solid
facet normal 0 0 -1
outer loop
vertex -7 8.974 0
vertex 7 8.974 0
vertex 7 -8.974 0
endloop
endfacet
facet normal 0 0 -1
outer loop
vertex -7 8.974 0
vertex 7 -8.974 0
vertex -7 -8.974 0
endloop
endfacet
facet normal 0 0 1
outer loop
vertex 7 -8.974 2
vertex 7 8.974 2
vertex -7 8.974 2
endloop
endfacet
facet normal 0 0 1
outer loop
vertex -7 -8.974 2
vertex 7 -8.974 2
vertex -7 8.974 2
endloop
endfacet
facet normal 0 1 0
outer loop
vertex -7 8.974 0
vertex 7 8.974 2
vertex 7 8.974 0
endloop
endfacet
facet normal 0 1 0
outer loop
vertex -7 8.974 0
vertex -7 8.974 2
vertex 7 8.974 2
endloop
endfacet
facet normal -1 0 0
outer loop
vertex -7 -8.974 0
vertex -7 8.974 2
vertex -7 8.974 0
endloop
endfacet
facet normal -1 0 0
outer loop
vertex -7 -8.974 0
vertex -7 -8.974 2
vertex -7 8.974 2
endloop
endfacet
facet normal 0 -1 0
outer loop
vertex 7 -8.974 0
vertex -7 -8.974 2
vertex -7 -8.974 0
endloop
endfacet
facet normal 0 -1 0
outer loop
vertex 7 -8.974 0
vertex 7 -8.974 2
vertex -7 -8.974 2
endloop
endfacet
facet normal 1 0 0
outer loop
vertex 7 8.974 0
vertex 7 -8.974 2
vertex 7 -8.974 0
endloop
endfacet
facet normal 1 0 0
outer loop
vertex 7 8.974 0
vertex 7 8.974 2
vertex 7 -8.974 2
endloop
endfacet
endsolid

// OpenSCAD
linear_extrude(2) offset(delta=1) projection(cut=false) rotate([25,0,0]) cube(12,center=true);
